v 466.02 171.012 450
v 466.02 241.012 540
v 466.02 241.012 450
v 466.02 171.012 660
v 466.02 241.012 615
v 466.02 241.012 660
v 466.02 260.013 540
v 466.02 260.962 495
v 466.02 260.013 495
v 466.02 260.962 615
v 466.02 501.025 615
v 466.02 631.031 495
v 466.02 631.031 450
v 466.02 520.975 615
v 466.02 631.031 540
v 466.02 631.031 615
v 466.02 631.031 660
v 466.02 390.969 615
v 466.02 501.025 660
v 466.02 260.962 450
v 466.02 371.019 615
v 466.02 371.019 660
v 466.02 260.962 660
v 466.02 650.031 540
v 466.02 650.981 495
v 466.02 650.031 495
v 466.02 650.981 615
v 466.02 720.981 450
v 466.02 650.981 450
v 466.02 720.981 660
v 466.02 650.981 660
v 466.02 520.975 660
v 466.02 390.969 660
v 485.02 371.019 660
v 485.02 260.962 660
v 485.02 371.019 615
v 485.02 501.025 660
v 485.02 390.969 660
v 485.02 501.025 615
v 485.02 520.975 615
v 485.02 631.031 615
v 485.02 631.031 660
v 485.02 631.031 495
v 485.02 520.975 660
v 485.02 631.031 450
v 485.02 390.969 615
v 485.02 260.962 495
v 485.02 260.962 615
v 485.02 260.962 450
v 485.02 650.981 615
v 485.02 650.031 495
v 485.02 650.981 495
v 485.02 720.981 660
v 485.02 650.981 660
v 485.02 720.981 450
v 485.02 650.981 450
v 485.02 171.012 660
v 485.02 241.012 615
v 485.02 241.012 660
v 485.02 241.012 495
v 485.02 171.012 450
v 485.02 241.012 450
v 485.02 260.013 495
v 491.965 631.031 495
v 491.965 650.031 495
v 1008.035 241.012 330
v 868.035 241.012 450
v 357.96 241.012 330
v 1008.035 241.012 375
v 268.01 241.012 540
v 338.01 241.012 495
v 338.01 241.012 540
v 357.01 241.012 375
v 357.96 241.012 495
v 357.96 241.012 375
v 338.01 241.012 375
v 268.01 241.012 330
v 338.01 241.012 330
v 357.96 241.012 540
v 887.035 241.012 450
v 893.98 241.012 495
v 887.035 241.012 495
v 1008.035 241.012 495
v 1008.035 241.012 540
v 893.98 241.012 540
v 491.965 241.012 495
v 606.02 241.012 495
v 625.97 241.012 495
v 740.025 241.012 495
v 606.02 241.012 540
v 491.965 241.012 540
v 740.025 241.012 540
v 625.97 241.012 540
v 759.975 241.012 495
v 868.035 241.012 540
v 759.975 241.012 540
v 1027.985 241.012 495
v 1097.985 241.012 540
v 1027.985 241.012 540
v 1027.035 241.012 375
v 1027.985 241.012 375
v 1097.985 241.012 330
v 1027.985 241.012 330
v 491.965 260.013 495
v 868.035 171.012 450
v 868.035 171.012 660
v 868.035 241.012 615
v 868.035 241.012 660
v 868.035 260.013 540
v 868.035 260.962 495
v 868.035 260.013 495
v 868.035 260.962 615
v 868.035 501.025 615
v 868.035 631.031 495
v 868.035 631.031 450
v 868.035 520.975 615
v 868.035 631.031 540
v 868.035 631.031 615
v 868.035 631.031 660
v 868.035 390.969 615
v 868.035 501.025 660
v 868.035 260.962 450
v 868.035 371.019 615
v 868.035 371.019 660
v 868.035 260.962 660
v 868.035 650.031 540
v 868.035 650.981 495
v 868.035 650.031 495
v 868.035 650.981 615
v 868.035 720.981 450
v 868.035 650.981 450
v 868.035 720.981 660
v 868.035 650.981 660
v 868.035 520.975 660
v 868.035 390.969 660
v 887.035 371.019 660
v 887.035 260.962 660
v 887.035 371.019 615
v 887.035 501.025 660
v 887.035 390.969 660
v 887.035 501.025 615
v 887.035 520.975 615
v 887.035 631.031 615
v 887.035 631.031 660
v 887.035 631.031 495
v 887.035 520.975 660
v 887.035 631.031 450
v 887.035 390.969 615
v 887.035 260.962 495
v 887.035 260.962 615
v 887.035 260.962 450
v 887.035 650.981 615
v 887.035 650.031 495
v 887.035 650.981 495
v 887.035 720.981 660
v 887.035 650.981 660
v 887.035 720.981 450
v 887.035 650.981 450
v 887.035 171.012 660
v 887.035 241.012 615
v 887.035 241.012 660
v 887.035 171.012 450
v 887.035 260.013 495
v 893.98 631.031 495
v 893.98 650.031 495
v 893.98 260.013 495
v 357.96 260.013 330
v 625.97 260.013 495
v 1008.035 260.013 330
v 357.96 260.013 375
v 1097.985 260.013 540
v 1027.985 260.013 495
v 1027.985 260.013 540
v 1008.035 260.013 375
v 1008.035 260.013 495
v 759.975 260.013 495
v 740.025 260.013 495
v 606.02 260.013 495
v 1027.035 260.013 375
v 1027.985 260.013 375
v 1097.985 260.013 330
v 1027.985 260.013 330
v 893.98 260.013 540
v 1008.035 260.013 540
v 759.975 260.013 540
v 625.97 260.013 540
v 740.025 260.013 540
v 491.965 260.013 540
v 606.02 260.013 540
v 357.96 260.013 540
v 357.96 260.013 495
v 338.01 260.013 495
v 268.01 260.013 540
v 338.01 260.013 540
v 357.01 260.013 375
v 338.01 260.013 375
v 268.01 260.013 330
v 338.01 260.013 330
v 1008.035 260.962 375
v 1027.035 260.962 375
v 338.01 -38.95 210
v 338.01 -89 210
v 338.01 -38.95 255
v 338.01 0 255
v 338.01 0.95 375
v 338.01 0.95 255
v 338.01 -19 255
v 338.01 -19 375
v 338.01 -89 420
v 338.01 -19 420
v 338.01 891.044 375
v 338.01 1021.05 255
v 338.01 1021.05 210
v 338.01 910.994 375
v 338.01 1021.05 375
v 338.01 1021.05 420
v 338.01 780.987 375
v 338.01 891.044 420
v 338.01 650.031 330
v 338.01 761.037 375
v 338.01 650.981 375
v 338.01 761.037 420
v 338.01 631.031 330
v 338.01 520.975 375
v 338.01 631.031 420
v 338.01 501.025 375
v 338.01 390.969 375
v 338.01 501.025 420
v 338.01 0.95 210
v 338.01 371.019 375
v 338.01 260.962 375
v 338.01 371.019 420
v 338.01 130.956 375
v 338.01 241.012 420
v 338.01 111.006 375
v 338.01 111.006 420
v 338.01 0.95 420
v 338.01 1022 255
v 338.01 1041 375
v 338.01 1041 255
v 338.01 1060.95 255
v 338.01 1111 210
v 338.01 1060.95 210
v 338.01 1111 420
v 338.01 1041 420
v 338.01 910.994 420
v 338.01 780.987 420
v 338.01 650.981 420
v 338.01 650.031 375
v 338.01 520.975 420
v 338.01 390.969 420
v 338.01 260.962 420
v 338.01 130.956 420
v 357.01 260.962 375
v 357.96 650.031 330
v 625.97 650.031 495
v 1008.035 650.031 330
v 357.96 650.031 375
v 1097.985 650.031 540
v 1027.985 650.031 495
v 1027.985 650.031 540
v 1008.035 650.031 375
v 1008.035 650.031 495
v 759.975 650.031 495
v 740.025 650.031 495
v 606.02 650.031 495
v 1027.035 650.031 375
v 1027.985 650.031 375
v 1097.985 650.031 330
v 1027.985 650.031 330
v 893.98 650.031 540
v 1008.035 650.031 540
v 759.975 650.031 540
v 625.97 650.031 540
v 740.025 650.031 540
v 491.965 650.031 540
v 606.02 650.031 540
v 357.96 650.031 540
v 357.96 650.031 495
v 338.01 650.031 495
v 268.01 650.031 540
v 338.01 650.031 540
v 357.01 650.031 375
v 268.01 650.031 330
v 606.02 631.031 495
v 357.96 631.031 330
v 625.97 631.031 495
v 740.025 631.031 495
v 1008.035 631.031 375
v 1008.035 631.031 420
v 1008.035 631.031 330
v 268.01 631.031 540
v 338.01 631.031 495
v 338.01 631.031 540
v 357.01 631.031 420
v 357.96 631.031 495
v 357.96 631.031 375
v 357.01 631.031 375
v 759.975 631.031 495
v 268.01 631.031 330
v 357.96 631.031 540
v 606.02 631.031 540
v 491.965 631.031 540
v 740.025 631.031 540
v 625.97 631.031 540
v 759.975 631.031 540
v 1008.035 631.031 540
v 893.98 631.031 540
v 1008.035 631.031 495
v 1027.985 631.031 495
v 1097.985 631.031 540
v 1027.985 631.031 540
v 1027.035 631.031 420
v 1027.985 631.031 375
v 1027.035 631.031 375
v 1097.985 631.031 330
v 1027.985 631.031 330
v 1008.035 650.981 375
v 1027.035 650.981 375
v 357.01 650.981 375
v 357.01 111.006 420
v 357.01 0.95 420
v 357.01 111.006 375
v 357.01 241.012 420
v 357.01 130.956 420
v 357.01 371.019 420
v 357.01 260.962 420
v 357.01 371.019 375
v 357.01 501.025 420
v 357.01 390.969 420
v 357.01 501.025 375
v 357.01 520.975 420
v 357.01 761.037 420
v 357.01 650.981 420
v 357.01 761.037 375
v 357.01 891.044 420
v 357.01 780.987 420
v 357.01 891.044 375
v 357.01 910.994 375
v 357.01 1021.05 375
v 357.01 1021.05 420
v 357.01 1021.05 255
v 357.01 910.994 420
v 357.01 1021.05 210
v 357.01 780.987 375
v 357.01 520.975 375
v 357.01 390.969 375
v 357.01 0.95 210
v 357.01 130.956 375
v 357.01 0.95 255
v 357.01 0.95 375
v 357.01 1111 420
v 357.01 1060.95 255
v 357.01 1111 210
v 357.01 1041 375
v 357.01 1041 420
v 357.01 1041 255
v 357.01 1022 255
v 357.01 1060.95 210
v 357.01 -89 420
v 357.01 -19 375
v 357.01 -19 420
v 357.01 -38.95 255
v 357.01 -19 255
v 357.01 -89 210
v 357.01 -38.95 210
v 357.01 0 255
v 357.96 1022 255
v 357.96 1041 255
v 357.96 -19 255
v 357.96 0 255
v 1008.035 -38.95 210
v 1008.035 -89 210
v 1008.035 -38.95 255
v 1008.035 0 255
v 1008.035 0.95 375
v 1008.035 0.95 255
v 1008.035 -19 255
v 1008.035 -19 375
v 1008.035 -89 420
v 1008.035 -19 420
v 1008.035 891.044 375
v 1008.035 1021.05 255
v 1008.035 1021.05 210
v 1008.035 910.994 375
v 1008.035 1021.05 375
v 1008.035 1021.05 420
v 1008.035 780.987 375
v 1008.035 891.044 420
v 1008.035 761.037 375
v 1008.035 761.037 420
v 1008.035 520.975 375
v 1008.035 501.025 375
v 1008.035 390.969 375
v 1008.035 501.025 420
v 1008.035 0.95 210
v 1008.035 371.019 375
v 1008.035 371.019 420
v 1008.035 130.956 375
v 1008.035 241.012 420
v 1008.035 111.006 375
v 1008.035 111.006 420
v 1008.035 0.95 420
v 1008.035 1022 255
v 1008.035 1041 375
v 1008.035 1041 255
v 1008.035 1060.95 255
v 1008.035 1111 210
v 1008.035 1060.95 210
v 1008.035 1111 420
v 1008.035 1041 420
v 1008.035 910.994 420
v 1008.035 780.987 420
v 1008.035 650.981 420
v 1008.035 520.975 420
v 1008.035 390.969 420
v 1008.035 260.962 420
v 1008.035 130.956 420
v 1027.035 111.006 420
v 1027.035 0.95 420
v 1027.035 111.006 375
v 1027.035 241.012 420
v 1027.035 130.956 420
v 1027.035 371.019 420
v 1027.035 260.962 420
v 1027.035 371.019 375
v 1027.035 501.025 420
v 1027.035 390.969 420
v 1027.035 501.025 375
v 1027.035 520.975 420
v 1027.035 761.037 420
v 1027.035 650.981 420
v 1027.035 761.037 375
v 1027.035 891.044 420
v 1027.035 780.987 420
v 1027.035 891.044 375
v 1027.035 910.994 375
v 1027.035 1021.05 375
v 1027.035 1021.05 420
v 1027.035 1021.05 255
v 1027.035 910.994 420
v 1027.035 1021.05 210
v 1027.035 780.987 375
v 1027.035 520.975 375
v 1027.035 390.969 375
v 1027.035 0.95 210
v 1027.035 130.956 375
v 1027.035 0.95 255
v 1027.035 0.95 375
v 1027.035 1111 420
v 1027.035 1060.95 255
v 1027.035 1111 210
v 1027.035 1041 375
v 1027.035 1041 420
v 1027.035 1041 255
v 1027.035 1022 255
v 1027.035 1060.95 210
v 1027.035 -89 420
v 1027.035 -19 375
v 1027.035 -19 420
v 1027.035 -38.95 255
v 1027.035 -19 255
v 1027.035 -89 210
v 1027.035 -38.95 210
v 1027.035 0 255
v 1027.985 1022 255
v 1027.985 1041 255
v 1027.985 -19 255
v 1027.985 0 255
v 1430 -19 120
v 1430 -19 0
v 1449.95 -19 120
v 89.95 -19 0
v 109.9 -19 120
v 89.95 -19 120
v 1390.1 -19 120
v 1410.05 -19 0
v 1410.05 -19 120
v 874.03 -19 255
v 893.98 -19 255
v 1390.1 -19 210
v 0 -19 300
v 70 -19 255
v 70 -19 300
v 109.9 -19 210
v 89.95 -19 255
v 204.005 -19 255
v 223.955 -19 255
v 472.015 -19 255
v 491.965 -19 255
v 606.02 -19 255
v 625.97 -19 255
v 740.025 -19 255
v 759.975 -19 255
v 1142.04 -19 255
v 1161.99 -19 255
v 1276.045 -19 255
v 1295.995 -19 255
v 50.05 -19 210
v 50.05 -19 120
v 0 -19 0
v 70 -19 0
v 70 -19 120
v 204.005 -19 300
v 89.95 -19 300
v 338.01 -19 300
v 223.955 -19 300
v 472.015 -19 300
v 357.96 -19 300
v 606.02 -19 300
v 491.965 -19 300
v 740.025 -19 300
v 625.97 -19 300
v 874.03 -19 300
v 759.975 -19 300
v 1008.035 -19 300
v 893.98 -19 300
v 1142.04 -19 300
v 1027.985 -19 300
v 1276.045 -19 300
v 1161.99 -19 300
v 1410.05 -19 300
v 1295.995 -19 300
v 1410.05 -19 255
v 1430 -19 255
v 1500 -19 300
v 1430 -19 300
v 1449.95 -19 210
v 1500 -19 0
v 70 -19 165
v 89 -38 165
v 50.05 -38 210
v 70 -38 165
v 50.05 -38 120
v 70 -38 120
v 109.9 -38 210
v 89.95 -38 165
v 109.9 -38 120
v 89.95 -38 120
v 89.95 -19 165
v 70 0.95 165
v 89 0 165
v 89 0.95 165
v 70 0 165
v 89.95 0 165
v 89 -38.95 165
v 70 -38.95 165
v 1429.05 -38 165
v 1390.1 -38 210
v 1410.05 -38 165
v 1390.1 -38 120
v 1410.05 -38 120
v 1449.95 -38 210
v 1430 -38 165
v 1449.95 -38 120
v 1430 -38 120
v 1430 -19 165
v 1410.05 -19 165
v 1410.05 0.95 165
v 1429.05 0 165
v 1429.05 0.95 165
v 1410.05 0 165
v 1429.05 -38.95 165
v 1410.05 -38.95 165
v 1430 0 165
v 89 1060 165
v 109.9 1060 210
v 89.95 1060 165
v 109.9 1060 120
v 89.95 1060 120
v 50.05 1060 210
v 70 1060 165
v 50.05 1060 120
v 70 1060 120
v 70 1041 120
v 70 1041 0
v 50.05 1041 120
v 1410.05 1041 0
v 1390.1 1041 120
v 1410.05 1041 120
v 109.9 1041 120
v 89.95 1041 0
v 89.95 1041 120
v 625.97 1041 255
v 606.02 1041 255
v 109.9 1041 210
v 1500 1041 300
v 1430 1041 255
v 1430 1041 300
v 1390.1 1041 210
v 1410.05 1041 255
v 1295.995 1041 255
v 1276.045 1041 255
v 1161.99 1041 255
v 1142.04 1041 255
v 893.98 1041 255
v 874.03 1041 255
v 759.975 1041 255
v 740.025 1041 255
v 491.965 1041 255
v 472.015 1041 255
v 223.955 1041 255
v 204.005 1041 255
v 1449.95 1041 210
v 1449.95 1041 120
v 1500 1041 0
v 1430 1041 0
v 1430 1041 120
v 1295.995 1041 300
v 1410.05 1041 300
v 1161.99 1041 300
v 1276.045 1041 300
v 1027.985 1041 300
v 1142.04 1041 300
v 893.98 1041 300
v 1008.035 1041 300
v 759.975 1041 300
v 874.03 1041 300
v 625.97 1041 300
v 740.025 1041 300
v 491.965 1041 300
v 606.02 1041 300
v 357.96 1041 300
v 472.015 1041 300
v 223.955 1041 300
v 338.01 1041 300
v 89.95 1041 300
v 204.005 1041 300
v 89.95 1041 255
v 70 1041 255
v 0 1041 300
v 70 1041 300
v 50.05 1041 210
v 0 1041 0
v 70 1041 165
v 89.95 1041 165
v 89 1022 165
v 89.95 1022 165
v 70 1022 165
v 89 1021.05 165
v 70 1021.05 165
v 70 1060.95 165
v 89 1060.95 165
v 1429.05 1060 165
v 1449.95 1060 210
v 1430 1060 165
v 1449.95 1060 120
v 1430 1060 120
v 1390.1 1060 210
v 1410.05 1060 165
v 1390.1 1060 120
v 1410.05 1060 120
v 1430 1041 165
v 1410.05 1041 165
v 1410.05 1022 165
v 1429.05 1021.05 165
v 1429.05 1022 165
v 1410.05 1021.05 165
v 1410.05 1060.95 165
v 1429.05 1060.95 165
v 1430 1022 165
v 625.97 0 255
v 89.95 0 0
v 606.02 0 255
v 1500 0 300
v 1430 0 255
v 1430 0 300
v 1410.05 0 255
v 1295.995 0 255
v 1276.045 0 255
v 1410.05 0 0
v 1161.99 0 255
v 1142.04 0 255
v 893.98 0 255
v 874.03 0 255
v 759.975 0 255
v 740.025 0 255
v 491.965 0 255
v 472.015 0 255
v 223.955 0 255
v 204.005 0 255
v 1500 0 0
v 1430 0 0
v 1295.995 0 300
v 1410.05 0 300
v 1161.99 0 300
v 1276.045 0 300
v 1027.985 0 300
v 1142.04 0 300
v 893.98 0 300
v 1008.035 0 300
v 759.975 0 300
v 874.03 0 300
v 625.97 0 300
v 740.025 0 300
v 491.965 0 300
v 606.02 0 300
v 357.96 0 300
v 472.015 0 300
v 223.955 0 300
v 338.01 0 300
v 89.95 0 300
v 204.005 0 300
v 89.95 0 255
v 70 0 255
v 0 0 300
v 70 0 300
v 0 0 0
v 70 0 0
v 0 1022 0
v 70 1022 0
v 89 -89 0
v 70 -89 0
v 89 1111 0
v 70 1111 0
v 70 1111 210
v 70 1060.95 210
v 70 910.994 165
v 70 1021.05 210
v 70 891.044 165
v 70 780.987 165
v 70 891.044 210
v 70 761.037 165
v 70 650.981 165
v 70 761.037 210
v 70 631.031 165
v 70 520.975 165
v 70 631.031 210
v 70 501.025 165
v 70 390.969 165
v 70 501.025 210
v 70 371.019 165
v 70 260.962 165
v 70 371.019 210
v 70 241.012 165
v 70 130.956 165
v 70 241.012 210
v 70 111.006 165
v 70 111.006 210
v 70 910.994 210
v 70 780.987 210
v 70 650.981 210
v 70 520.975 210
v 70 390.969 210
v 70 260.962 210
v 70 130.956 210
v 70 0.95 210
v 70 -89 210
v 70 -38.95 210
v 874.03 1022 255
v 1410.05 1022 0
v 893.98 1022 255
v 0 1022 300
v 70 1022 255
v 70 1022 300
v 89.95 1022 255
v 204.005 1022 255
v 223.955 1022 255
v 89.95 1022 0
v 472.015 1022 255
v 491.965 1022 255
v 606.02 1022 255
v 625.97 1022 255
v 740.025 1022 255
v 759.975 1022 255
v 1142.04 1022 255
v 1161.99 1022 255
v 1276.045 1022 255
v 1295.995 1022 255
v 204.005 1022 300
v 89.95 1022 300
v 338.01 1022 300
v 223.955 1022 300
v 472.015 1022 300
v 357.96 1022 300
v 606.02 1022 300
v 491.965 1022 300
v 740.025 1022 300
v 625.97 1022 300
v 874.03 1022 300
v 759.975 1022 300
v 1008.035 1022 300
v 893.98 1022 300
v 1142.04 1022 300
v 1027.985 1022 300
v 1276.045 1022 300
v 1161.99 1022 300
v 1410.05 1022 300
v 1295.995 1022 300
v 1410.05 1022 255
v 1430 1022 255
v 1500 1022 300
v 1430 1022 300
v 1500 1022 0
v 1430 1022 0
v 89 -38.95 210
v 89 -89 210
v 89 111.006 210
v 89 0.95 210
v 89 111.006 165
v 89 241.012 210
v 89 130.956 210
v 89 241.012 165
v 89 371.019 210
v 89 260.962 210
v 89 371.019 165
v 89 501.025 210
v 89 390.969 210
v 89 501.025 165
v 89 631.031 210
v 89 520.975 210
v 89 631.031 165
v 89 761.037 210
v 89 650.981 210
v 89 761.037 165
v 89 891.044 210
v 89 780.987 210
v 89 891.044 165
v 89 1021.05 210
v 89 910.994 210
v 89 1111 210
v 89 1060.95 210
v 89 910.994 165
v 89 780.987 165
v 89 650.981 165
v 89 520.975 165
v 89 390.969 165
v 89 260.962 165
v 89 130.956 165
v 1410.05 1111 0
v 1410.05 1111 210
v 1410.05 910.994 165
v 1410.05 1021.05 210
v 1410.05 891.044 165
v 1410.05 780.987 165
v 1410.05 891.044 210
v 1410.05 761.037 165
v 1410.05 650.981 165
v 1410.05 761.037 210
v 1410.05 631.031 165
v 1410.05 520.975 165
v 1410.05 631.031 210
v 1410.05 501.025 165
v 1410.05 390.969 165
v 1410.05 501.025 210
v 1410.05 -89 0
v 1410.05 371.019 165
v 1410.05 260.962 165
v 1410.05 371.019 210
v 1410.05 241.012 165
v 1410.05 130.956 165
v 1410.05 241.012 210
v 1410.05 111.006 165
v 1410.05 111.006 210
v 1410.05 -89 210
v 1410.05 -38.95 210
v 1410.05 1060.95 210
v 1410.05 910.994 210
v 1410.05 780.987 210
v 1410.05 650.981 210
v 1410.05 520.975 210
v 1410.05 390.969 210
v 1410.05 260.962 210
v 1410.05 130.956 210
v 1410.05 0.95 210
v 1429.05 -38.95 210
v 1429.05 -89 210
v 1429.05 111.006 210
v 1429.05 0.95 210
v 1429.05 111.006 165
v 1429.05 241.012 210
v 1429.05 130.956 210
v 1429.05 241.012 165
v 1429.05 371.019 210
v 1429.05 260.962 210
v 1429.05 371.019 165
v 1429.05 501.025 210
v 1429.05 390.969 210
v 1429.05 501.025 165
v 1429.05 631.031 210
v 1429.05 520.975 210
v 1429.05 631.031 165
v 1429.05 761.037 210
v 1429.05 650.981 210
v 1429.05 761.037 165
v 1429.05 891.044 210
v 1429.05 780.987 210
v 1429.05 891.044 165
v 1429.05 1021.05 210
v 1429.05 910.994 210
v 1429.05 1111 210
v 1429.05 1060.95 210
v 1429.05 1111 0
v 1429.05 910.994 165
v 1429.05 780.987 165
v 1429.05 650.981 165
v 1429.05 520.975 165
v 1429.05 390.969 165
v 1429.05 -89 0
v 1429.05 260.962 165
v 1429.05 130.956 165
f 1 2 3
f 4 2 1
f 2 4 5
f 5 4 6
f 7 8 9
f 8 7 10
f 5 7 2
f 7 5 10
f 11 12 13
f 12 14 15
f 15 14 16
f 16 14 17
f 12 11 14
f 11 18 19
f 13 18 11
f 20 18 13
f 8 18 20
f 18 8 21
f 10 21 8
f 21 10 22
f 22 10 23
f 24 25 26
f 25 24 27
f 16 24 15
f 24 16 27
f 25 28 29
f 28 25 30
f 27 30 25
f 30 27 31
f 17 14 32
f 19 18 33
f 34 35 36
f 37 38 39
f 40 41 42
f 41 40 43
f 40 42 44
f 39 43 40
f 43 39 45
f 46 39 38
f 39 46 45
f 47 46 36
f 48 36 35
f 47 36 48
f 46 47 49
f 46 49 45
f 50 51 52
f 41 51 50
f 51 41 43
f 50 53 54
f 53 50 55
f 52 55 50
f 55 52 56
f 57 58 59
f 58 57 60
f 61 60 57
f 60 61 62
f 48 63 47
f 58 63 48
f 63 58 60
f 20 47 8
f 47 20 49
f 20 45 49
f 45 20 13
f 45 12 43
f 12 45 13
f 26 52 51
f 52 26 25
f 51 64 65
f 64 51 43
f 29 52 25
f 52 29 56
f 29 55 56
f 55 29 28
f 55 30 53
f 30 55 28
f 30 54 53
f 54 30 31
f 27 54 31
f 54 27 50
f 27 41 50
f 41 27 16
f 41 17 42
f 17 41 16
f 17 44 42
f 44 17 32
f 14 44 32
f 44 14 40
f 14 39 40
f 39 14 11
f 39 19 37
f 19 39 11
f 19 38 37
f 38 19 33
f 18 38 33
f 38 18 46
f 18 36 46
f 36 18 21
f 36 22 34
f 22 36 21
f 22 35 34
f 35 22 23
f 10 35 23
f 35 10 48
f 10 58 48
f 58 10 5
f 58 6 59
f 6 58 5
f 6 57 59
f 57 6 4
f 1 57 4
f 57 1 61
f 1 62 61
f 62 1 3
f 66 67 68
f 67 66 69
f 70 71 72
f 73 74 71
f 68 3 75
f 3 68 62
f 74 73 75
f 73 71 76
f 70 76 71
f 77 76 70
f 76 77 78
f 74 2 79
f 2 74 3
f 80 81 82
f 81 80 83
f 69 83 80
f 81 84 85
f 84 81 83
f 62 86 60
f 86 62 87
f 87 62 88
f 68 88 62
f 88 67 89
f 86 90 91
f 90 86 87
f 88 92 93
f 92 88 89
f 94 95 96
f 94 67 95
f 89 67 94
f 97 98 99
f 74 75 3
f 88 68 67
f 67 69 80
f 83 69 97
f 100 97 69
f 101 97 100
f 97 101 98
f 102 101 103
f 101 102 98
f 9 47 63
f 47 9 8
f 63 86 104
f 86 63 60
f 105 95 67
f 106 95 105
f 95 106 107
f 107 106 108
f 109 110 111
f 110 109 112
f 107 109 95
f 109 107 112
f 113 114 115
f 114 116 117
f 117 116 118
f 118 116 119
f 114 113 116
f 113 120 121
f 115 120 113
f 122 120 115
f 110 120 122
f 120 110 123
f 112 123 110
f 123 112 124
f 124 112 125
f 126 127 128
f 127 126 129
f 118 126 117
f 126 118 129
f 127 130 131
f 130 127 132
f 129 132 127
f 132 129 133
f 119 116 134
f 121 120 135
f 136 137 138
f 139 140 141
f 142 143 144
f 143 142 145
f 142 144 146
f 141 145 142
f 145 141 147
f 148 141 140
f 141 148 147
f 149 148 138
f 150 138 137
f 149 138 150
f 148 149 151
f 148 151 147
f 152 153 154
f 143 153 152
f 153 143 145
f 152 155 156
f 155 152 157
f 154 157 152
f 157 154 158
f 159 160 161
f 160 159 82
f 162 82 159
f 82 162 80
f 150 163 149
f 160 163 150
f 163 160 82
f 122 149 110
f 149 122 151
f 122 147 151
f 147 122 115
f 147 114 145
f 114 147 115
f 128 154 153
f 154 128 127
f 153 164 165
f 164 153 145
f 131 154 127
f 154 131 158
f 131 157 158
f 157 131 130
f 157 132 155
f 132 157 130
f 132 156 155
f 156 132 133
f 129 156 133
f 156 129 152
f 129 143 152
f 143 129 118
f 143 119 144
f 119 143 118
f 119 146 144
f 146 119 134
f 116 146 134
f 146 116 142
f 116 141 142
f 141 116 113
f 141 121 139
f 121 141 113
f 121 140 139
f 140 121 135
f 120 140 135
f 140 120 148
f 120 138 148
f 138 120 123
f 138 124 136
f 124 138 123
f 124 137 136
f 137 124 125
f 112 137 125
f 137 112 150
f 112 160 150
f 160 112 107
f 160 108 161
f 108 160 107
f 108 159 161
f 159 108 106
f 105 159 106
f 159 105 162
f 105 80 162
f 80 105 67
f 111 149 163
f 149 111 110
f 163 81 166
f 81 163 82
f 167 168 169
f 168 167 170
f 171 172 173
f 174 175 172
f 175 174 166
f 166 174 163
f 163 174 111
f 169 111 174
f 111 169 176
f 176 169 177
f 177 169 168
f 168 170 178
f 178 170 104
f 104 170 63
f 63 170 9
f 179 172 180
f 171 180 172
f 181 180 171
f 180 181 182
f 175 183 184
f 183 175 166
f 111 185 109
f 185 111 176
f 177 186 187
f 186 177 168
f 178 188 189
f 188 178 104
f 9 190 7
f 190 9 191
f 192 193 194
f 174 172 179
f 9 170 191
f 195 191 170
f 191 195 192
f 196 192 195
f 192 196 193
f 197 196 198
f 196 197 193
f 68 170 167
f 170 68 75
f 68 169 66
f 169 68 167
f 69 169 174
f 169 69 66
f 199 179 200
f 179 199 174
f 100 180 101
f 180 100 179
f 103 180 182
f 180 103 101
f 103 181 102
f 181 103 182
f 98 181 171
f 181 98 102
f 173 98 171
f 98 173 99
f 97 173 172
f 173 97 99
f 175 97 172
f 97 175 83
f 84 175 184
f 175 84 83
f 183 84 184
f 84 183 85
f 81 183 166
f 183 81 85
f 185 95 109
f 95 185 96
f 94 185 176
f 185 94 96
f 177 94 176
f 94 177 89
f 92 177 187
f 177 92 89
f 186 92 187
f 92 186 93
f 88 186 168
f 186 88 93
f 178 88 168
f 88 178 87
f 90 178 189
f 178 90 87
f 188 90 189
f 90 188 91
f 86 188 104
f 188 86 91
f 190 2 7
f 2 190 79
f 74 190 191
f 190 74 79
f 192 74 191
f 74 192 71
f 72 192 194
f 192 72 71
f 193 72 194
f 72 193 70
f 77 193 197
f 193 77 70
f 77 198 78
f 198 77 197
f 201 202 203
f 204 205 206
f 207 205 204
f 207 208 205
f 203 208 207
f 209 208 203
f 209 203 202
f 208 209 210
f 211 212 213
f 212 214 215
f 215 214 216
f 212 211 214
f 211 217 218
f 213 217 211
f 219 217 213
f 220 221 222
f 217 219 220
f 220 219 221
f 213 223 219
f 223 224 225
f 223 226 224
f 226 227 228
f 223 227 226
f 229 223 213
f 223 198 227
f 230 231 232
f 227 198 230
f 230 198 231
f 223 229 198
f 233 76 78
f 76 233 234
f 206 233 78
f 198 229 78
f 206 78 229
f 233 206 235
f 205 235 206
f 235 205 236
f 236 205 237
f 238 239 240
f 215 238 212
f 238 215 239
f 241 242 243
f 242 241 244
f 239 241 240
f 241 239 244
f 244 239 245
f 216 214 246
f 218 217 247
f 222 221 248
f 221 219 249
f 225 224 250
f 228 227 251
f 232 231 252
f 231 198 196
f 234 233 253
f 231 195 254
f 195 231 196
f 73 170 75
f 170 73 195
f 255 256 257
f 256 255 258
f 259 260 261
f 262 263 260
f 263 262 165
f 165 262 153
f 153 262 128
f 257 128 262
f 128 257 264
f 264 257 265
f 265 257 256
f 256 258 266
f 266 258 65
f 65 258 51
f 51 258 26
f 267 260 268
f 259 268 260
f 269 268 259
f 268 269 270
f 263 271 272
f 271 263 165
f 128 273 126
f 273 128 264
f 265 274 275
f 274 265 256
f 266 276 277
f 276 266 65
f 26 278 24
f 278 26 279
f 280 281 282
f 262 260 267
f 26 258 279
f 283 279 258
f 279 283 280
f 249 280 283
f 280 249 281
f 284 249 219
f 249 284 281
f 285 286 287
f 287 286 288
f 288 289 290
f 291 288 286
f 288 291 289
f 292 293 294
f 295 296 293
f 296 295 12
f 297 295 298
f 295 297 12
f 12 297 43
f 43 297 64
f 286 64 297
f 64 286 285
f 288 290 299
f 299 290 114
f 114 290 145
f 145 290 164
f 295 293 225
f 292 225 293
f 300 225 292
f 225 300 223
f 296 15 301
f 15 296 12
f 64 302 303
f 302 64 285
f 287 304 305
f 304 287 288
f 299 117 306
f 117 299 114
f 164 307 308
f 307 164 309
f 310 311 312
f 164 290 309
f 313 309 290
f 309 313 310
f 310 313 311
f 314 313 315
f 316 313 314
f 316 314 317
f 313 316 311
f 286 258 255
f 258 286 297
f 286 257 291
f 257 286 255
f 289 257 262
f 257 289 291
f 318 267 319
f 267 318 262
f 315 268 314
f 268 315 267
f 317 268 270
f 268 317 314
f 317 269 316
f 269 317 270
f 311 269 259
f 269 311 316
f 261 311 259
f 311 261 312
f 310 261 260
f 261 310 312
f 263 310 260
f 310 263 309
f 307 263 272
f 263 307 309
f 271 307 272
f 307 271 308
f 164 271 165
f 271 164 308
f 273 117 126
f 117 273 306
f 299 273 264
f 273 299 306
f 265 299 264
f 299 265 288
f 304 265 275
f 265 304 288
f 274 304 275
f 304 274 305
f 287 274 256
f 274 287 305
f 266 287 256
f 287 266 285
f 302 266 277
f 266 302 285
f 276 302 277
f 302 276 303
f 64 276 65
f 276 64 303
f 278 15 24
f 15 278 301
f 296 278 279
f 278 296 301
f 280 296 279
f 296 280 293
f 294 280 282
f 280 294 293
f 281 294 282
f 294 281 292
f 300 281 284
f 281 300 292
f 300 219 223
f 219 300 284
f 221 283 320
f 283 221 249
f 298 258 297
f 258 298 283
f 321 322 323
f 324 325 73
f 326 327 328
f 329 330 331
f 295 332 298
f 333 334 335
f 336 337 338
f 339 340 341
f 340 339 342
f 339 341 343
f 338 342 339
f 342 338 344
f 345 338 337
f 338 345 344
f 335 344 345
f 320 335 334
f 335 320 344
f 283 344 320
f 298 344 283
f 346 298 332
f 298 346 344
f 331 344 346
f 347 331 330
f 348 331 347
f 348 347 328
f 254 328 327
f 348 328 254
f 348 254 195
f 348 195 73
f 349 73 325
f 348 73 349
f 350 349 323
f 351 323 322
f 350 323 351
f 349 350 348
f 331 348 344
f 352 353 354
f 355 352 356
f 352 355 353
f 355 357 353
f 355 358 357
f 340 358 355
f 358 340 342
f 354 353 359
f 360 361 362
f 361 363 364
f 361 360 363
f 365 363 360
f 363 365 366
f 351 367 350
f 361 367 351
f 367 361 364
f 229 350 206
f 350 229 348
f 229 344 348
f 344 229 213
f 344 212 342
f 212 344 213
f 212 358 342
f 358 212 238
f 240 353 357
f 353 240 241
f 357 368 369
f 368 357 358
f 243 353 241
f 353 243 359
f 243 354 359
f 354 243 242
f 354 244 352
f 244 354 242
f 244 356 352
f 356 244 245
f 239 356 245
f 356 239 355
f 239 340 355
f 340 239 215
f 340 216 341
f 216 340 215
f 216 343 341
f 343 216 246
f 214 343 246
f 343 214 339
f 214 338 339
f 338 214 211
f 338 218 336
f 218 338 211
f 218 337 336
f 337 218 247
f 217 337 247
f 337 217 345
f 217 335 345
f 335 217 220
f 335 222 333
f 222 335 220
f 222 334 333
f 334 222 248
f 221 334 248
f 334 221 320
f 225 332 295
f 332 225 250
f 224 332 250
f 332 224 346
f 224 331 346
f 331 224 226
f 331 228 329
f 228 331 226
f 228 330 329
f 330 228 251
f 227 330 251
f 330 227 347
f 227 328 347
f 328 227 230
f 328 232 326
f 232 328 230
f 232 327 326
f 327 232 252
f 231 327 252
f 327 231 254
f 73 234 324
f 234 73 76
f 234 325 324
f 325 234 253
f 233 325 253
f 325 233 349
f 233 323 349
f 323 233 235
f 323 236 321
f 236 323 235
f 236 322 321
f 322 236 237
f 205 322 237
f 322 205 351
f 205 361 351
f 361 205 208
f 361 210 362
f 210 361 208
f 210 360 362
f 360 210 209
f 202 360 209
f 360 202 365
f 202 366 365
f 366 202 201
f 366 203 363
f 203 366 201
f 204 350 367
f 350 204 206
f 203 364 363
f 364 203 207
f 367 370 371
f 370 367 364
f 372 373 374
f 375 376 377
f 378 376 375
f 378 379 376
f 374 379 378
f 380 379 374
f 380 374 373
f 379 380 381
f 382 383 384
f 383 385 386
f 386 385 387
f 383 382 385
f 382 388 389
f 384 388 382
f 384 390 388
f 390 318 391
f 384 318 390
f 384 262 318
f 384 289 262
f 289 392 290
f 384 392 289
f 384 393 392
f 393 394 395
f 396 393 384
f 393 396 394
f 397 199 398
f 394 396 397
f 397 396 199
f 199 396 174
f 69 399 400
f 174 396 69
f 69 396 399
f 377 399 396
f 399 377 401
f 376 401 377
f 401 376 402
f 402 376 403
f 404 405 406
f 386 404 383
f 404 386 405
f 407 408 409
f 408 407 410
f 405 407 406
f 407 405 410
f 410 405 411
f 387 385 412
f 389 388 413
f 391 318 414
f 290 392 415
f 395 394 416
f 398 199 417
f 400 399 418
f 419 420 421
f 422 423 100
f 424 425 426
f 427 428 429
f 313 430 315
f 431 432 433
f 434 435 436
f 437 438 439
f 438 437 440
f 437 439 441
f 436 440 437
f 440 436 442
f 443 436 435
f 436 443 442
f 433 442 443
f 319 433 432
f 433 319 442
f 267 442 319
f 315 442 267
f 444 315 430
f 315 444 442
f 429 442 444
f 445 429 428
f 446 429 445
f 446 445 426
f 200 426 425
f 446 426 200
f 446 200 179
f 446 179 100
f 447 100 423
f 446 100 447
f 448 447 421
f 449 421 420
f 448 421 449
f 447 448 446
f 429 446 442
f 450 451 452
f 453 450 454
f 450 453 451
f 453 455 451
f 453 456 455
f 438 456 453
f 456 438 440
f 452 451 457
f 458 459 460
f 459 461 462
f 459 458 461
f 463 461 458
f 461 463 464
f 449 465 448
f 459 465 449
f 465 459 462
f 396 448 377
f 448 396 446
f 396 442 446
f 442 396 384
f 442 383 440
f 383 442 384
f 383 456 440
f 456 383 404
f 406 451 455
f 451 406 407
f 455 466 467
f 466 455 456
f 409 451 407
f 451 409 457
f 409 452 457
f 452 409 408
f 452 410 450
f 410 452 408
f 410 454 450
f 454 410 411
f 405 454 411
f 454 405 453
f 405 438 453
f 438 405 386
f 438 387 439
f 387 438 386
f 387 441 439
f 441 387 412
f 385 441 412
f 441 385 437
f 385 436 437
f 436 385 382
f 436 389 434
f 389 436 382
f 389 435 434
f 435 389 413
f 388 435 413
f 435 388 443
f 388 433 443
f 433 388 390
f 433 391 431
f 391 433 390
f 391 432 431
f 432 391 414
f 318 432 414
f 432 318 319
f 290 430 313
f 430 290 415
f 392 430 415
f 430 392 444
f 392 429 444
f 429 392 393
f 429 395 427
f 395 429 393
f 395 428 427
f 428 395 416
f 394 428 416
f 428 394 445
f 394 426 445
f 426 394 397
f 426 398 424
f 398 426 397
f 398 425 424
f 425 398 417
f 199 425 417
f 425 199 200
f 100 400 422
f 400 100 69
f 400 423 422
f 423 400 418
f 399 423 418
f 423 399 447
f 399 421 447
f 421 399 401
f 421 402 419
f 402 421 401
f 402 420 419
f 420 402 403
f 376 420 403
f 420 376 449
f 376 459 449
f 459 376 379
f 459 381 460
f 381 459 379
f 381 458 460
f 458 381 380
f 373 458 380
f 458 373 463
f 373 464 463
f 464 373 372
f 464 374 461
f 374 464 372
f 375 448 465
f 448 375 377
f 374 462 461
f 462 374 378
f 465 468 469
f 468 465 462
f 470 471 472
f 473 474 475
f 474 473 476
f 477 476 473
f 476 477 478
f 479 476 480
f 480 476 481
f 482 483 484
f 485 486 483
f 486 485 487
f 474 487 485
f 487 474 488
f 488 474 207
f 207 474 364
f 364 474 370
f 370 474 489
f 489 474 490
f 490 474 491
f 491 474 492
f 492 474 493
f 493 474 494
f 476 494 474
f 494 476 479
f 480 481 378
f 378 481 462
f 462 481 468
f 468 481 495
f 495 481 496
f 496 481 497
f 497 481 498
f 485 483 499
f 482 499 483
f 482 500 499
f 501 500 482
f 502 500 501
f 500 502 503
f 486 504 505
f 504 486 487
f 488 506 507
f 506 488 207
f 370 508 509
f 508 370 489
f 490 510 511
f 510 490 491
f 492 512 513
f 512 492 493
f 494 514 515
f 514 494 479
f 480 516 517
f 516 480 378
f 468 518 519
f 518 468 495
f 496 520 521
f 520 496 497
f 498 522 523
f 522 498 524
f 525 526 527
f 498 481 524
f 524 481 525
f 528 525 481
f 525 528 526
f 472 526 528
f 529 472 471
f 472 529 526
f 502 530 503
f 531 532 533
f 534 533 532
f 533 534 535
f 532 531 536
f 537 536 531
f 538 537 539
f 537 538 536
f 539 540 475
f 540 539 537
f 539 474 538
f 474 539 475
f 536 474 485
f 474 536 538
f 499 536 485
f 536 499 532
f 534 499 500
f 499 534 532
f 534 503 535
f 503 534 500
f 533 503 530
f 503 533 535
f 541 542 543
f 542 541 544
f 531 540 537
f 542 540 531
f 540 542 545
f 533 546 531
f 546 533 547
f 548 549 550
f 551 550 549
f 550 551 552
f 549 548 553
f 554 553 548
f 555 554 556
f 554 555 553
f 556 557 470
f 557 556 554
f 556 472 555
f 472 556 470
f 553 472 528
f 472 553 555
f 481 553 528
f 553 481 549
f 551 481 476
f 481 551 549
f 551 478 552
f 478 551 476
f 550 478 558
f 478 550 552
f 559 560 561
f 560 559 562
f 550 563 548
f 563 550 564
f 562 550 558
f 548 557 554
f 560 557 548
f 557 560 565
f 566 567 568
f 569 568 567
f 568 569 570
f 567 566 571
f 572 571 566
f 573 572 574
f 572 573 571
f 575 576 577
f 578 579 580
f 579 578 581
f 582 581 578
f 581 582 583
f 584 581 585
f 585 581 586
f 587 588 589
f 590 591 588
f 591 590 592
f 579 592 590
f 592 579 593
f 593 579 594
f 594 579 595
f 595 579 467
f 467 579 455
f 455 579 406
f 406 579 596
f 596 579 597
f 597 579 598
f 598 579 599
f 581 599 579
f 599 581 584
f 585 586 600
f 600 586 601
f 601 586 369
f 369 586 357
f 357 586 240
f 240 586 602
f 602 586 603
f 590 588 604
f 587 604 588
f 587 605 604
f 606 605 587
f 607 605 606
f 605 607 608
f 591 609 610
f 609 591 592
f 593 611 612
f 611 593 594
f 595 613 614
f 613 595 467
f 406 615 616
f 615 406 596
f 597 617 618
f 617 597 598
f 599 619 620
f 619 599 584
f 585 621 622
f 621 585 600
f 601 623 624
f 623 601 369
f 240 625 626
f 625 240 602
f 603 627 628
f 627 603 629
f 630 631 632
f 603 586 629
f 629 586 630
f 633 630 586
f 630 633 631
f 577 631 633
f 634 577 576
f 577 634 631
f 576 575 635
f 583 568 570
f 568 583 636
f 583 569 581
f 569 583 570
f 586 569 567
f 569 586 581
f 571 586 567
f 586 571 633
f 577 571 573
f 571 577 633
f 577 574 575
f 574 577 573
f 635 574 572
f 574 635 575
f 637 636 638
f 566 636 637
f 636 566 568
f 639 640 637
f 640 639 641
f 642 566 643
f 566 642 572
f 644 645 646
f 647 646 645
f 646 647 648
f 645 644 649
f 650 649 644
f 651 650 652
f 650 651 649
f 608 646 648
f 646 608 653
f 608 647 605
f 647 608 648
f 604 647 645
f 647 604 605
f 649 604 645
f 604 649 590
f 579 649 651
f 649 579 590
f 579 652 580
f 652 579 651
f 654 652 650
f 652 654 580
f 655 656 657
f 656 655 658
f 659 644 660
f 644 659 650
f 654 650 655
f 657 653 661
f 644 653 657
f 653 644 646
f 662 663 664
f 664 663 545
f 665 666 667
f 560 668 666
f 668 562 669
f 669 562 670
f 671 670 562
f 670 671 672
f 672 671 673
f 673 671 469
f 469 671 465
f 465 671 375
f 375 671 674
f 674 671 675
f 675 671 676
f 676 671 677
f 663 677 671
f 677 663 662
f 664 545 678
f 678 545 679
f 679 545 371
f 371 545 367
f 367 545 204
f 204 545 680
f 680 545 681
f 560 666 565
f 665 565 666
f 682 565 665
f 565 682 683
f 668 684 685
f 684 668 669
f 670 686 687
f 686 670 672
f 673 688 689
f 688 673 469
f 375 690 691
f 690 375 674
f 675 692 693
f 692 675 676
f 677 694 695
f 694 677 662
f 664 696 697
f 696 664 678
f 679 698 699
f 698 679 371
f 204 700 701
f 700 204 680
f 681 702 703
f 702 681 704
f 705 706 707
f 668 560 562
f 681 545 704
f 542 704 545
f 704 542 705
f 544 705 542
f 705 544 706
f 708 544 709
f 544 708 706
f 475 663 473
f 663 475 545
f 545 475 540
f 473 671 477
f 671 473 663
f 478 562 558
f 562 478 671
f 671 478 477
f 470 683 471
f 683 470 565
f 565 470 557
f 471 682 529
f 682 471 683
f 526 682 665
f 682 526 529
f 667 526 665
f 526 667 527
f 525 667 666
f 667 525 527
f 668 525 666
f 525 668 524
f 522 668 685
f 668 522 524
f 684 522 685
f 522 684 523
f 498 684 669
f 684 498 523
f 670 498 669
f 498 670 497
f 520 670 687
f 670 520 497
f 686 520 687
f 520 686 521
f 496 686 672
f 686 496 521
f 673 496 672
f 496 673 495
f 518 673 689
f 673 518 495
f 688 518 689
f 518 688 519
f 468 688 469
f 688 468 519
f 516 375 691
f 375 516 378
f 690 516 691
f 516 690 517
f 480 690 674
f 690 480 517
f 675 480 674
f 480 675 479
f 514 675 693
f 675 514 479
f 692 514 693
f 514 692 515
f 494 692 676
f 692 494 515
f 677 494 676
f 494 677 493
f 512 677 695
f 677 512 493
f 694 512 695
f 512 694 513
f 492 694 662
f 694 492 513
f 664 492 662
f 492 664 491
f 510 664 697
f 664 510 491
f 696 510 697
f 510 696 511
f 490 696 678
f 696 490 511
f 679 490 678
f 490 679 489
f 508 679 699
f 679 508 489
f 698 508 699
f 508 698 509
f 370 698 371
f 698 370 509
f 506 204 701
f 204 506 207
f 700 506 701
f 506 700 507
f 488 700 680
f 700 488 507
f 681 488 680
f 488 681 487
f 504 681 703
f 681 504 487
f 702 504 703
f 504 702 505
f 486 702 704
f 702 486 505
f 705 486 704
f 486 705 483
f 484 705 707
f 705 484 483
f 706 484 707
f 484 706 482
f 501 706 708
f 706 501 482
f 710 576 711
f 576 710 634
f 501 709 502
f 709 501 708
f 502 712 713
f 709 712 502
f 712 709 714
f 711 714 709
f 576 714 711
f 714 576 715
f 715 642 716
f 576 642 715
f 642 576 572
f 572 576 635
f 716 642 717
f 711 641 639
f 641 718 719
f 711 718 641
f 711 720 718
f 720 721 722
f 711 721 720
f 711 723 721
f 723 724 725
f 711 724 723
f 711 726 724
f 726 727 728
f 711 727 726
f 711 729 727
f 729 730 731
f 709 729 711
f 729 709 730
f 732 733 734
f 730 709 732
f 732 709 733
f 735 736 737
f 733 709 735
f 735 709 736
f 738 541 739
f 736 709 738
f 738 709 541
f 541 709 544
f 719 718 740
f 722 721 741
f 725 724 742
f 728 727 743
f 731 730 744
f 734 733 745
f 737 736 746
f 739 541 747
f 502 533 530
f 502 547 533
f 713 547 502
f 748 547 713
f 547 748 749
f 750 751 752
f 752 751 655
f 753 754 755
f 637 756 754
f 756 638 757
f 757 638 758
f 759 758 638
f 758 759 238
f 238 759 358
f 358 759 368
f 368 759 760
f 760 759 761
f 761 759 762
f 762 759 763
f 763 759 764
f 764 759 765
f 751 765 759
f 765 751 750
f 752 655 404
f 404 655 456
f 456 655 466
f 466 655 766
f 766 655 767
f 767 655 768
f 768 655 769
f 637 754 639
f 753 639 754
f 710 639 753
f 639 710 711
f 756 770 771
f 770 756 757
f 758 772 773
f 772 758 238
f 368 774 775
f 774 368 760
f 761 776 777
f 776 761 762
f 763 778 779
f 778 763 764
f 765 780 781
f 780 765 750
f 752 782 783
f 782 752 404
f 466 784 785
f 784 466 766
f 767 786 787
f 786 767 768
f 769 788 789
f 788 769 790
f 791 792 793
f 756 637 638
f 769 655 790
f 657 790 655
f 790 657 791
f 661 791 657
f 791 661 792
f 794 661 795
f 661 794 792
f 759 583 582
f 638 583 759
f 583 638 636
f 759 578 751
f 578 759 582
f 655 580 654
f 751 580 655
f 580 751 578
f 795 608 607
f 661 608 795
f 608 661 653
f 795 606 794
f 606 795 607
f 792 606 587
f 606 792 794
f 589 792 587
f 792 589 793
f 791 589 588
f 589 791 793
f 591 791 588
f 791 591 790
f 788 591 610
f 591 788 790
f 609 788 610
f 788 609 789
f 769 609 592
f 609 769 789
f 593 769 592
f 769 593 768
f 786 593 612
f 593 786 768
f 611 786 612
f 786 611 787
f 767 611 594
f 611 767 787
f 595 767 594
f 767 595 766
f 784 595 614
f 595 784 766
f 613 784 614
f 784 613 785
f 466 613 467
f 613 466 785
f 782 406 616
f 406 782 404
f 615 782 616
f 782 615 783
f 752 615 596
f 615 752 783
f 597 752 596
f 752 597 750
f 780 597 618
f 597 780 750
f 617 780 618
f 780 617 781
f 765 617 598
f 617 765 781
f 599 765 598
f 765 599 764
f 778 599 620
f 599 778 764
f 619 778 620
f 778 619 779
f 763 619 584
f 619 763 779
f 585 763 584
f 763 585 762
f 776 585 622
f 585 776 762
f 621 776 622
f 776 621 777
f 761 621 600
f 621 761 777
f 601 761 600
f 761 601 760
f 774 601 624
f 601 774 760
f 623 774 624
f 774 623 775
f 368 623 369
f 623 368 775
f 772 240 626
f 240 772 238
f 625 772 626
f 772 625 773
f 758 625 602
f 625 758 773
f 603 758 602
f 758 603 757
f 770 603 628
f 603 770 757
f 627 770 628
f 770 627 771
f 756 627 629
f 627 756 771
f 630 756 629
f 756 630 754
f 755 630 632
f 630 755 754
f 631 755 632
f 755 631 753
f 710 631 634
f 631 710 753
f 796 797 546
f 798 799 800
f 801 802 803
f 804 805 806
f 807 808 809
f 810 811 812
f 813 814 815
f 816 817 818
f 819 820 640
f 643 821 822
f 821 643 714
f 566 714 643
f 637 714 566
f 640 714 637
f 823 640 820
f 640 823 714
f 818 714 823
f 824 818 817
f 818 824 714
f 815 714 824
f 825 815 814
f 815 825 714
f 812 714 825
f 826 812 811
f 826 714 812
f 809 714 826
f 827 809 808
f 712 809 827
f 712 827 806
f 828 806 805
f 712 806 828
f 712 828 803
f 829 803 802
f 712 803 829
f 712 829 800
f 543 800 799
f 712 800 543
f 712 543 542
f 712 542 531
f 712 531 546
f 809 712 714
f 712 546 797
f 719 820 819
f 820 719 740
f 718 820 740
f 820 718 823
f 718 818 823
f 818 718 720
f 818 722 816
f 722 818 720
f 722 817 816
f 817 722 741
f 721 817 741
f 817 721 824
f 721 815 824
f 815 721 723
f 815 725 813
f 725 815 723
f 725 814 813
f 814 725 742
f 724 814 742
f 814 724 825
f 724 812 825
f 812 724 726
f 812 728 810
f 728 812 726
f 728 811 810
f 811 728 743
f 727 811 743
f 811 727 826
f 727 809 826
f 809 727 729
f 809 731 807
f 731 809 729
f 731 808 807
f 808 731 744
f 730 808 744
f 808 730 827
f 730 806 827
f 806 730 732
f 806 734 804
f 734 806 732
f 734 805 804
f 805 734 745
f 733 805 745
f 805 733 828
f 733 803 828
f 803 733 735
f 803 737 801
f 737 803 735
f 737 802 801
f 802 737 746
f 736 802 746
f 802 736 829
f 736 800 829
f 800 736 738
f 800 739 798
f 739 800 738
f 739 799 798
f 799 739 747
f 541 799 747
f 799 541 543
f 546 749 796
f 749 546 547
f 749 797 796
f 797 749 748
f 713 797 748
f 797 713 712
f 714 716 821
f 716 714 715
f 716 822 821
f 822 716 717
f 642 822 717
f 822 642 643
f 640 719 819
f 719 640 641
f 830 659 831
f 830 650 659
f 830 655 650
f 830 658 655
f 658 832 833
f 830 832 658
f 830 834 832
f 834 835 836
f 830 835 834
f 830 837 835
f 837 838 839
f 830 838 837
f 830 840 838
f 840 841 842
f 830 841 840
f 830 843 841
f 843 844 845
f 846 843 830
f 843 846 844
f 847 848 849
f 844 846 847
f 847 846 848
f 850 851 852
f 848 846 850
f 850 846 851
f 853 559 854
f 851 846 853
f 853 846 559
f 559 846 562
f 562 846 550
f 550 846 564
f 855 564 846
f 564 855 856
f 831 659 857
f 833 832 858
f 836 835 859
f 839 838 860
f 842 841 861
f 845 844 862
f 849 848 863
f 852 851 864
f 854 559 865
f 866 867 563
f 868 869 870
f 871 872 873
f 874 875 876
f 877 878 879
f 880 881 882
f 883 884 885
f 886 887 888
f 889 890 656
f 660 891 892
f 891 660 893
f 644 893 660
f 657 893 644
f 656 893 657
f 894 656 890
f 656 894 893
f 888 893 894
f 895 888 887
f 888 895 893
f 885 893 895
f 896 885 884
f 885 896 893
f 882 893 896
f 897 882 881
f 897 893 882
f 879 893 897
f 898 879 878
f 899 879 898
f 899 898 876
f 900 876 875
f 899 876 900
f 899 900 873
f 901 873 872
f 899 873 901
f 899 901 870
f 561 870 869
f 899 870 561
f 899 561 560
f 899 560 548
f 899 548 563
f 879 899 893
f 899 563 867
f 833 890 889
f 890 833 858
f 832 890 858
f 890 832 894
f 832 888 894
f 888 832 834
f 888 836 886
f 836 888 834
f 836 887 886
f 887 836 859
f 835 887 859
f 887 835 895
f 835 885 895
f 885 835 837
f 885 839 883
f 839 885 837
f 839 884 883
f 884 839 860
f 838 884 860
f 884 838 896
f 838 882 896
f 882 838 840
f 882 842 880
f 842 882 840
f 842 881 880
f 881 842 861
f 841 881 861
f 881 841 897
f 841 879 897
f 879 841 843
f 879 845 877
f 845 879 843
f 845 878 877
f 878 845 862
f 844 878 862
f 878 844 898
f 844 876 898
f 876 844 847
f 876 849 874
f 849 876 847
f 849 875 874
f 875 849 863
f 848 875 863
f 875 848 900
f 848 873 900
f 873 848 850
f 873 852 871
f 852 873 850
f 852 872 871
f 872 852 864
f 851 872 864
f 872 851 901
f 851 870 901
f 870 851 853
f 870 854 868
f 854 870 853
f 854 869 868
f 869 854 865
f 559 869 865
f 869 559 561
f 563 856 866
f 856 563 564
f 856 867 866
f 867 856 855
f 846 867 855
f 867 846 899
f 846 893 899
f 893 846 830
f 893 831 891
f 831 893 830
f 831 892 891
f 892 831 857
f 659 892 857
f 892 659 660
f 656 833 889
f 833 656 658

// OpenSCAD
/*  Squarden. Highly configurable gardening squares based on Growgrid by Aker but here you can change the wood thickness.
    Copyright (C) 2016  PMorel for Thilab (www.thilab.fr)

    This program is free software: you can redistribute it and/or modify
    it under the terms of the GNU General Public License as published by
    the Free Software Foundation, either version 3 of the License, or
    (at your option) any later version.

    This program is distributed in the hope that it will be useful,
    but WITHOUT ANY WARRANTY; without even the implied warranty of
    MERCHANTABILITY or FITNESS FOR A PARTICULAR PURPOSE.  See the
    GNU General Public License for more details.

    You should have received a copy of the GNU General Public License
    along with this program.  If not, see <http://www.gnu.org/licenses/>.
*/
/* [Build parameters (in millimeters)] */
//Scale (to be able to test your design. The scale is not applied to the wood thickness)
scale = 1; //[0.1:0.1:1]

// Length of the left and right sides of the base
side_length=1500;
// Height of the left and right sides of the base 
side_height=300;
// Margin to apply on the left and right sides 
base_side_margin=70;
 // Longueur des cotés avant et arrière de la base  mais aussi du niveau 1 
 // Length of front and back sides
front_length=1200;
// Wood thickness
wood_thick=19;
// Slack in the slits in percentage of the wood thickness
slack=5;

// Minimal distance between two slits. Used to calculate the number of slits on each side 
slit_min=130;

// 2D or 3D representation.
type_of_view="3D"; // [2D,3D]

/* [3D View only] */

// Slit position of the fist level rear side
level1_pos_rear=3;
// Slit position of the fist level front side
level1_pos_front=8;
// Slit position of the second level left side
level2_pos_left=3;
// Slit position of the second right left side
level2_pos_right=6;
// Slit position of the third level rear side
level3_pos_rear=2;
// Slit position of the third level front side
level3_pos_front=5;

/* [Hidden] */

// Calculated

base_side_length=side_length*scale;
base_side_height=side_height*scale;
side_margin=base_side_margin*scale;
base_front_height=0.7*base_side_height;
ecart_slit_min=slit_min*scale;
front_margin=side_margin;
base_front_length=front_length*scale;
// Largeur d'une fente (10% de l'épaisseur du bois)
slit_width=wood_thick*(1+slack/100); //10 pourcent de marge pour l'emboitement
// Hauteur d'une fente (dépend des hauteurs des cotés avant/arrière et gauche/droit
slit_height=(base_side_height - base_front_height)/2;

if( type_of_view=="2D" )
    draw_2D();
else
    draw_3D();


// Draw a 2D view. Export it as DXF to use it on your own CNC machine.
module draw_2D() {
    separ_pieces = 20*scale;
    blocker_shift_Y = slit_height*2 + separ_pieces;
    blocker_shift_X = slit_width*3 + separ_pieces;

    // Niveau 1 avant / arrière
    nb_slits_base = getSlits(base_side_length, side_margin);
    nb_slits_front = getSlits(base_front_length, front_margin);
    shift_side = getShiftSlit(base_side_length, side_margin, nb_slits_base)+slit_width;
    shift_front = getShiftSlit(base_front_length, front_margin, nb_slits_front)+slit_width;
    
    // Niveau 2 gauche et droite            
    level2_length = side_margin*2 + shift_side*(level1_pos_front-level1_pos_rear)+slit_width;

    // Level 3 avant / arrière
    level3_length = front_margin*2 + shift_front*(level2_pos_right-level2_pos_left)+slit_width;
    
    base_side_shift_X = base_side_length + separ_pieces;
    base_side_shift_Y = base_side_height + separ_pieces;

    base_front_shift_X = base_front_length + separ_pieces;
    base_front_shift_Y = base_front_height + separ_pieces;


    
    translate([0, 0]) {

        // Base mur avant et arrière
        translate([0,0])
            rotate([0,0,0])
                    base_front_rear();

        translate([0,base_front_shift_Y])
            rotate([0,0,0])
                    base_front_rear();
        
        // Niveau 1
        translate([0,base_front_shift_Y*2]) {
            translate([0,0])
                rotate([0,0,0])
                    level1_front_rear();

            translate([0,base_front_shift_Y])
                rotate([0,0,0])
                     level1_front_rear();
        }
        
        // Base murs gauche et droite
        translate([0, base_front_shift_Y*4]) {
            
            translate([0,0])
                rotate([0,0,0])
                        base_left_right();

            translate([0,base_side_shift_Y])
                rotate([0,0,0])
                        base_left_right();
            
            // Blockers
            translate([base_side_shift_X,0]) {
                translate([0,0])
                    rotate([0,0,0])
                           do_blocker();

                translate([0,blocker_shift_Y*1])
                    rotate([0,0,0])
                            do_blocker();

                translate([0,blocker_shift_Y*2])
                    rotate([0,0,0])
                            do_blocker();

                translate([0,blocker_shift_Y*3])
                    rotate([0,0,0])
                            do_blocker();
            }

        }
    }

    // Niveaux 2 et 3
    translate([base_front_shift_X,0]) {

        translate([0, 0]) {
            
            translate([0,0])
                rotate([0,0,0])
                        level2_3(level2_length, side_margin);

            translate([0,base_front_shift_Y])
                rotate([0,0,0])
                        level2_3(level2_length, side_margin);
            
            translate([0, base_front_shift_Y*2]) {
                
                translate([0,0]) 
                    rotate([0,0,0])
                            level2_3(level3_length, front_margin);

                translate([0,base_front_shift_Y])
                    rotate([0,0])
                            level2_3(level3_length, front_margin);
            }            
        }         
    }
}


// Draw a 3D view. Used to see if everything is correct before to export it in DXF 
module draw_3D() {
    translate([side_margin-slit_width,-wood_thick,base_front_height-2*slit_height])
        rotate([90,0,0])
            linear_extrude(wood_thick) 
                do_blocker();

    translate([base_side_length-side_margin-slit_width*2,-wood_thick,base_front_height-2*slit_height])
        rotate([90,0,0])
            linear_extrude(wood_thick) 
                do_blocker();

    translate([side_margin-slit_width,base_front_length-2*side_margin,base_front_height-2*slit_height])
        rotate([90,0,0])
            linear_extrude(wood_thick) 
                do_blocker();

    translate([base_side_length-side_margin-slit_width*2,base_front_length-2*side_margin,base_front_height-2*slit_height])
        rotate([90,0,0])
            linear_extrude(wood_thick) 
                do_blocker();
        
    // Base murs gauche et droite
    translate([0,0,0])
        rotate([90,0,0])
            linear_extrude(wood_thick) 
                base_left_right();

    translate([0,base_front_length-2*front_margin-wood_thick,0])
        rotate([90,0,0])
            linear_extrude(wood_thick) 
                base_left_right();
                
    // Base mur avant et arrière
    translate([side_margin,-front_margin-wood_thick,0])
        rotate([90,0,90])
            linear_extrude(wood_thick) 
                base_front_rear();

    translate([base_side_length - side_margin - slit_width,-front_margin-wood_thick,0])
        rotate([90,0,90])
            linear_extrude(wood_thick) 
                base_front_rear();

    // Niveau 1 avant / arrière
    nb_slits_base = getSlits(base_side_length, side_margin);
    nb_slits_front = getSlits(base_front_length, front_margin);
    shift_side = getShiftSlit(base_side_length, side_margin, nb_slits_base)+slit_width;
    shift_front = getShiftSlit(base_front_length, front_margin, nb_slits_front)+slit_width;

    translate([front_margin+shift_side*(level1_pos_rear-1),0,base_front_height]) {
        translate([0,-front_margin-wood_thick,0])
            rotate([90,0,90])
                linear_extrude(wood_thick) 
                    level1_front_rear();

        translate([shift_side*(level1_pos_front-level1_pos_rear),-front_margin-wood_thick,0])
            rotate([90,0,90])
                linear_extrude(wood_thick) 
                    level1_front_rear();

        // Niveau 2 gauche et droite            
        level2_length = side_margin*2 + shift_side*(level1_pos_front-level1_pos_rear)+slit_width;

        //Translation globale de tous les niveaux à partir du 2 pour pouvoir travailler comme si on était à l'origine
        translate([-side_margin, shift_front*(level2_pos_left-1)-front_margin, (base_front_height-2*slit_height)]) {
            
            translate([0,front_margin,0])
                rotate([90,0,0])
                    linear_extrude(wood_thick) 
                        level2_3(level2_length, side_margin);

            translate([0,shift_front*(level2_pos_right-level2_pos_left)+front_margin,0])
                rotate([90,0,0])
                    linear_extrude(wood_thick) 
                        level2_3(level2_length, side_margin);
            
            // Level 3 avant / arrière
            level3_length = front_margin*2 + shift_front*(level2_pos_right-level2_pos_left)+slit_width;
            translate([shift_side*(level2_pos_left-1)-side_margin, -wood_thick, base_front_height-2*slit_height]) {
                
                translate([0,0,0]) // shift_front*(level3_pos_rear-1)
                    rotate([90,0,90])
                        linear_extrude(wood_thick) 
                            level2_3(level3_length, front_margin);

                translate([shift_side*(level2_pos_right-level2_pos_left),0,0])
                    rotate([90,0,90])
                        linear_extrude(wood_thick) 
                            level2_3(level3_length, front_margin);
            }            
        }         
    }
}

module base_left_right() {
    difference() {
        square([base_side_length,base_side_height]);
        translate([0,base_side_height-slit_height,0]) 
            do_slits(base_side_length,side_margin, slit_width);
        translate([side_margin, 0, 0])
            do_slit(slit_width, base_front_height-slit_height);
        translate([base_side_length-side_margin-slit_width, 0, 0])
            do_slit(slit_width, base_front_height-slit_height);
    }
}



module base_front_rear() {
    difference() {
        square([base_front_length,base_front_height]);
        translate([0,base_front_height-slit_height,0]) 
            do_slits(base_front_length,front_margin, slit_width);
        translate([side_margin-slit_width, base_front_height-slit_height, 0])
            do_slit();
        translate([base_front_length-side_margin, base_front_height-slit_height, 0])
            do_slit();
    }    
}

module level1_front_rear() {
    difference() {
        square([base_front_length,base_front_height]);
        translate([0,base_front_height-slit_height,0]) 
            do_slits(base_front_length,front_margin, slit_width);
        translate([front_margin-slit_width, 0, 0])
            do_slit();
        translate([base_front_length-front_margin, 0, 0])
            do_slit();
        translate([base_front_length-front_margin-slit_width, 0, 0])
            do_slit();
        translate([front_margin, 0, 0])
            do_slit();
    }
}

module level2_3(length, margin) {
    difference() {
        square([length,base_front_height]);
        translate([0,base_front_height-slit_height,0]) 
            do_slits(length, margin, slit_width);
        *translate([margin-slit_width, 0, 0])
            do_slit();
        *translate([length-margin, 0, 0])
            do_slit();
        translate([length-margin-slit_width, 0, 0])
            do_slit();
        translate([margin, 0, 0])
            do_slit();
    }

}


module do_slit(width=slit_width, height=slit_height) {
    square([width, height]);
}

module do_slits(length, margin, slit_width) {

    slits = getSlits(length, margin);
    shift_slit = getShiftSlit(length, margin, slits );
    
    echo("Slits=", floor(slits), " shift_slit=", shift_slit);
    for(i=[0:slits-1]) {
        translate([i*(shift_slit+slit_width)+margin, 0, 0])
            do_slit();
    }
}

module do_blocker() {
            difference() {
                square([slit_width*3, slit_height*2]);
                translate([slit_width,0])
                    do_slit();
            }
}

function getShiftSlit(length, margin, nb_slits) = (getSlitZone(length, margin) - nb_slits*slit_width)/(nb_slits - 1);

function getSlits(length, margin) = ceil(getSlitZone(length, margin) / ecart_slit_min);

function getSlitZone( length, margin ) = length-2*margin;
